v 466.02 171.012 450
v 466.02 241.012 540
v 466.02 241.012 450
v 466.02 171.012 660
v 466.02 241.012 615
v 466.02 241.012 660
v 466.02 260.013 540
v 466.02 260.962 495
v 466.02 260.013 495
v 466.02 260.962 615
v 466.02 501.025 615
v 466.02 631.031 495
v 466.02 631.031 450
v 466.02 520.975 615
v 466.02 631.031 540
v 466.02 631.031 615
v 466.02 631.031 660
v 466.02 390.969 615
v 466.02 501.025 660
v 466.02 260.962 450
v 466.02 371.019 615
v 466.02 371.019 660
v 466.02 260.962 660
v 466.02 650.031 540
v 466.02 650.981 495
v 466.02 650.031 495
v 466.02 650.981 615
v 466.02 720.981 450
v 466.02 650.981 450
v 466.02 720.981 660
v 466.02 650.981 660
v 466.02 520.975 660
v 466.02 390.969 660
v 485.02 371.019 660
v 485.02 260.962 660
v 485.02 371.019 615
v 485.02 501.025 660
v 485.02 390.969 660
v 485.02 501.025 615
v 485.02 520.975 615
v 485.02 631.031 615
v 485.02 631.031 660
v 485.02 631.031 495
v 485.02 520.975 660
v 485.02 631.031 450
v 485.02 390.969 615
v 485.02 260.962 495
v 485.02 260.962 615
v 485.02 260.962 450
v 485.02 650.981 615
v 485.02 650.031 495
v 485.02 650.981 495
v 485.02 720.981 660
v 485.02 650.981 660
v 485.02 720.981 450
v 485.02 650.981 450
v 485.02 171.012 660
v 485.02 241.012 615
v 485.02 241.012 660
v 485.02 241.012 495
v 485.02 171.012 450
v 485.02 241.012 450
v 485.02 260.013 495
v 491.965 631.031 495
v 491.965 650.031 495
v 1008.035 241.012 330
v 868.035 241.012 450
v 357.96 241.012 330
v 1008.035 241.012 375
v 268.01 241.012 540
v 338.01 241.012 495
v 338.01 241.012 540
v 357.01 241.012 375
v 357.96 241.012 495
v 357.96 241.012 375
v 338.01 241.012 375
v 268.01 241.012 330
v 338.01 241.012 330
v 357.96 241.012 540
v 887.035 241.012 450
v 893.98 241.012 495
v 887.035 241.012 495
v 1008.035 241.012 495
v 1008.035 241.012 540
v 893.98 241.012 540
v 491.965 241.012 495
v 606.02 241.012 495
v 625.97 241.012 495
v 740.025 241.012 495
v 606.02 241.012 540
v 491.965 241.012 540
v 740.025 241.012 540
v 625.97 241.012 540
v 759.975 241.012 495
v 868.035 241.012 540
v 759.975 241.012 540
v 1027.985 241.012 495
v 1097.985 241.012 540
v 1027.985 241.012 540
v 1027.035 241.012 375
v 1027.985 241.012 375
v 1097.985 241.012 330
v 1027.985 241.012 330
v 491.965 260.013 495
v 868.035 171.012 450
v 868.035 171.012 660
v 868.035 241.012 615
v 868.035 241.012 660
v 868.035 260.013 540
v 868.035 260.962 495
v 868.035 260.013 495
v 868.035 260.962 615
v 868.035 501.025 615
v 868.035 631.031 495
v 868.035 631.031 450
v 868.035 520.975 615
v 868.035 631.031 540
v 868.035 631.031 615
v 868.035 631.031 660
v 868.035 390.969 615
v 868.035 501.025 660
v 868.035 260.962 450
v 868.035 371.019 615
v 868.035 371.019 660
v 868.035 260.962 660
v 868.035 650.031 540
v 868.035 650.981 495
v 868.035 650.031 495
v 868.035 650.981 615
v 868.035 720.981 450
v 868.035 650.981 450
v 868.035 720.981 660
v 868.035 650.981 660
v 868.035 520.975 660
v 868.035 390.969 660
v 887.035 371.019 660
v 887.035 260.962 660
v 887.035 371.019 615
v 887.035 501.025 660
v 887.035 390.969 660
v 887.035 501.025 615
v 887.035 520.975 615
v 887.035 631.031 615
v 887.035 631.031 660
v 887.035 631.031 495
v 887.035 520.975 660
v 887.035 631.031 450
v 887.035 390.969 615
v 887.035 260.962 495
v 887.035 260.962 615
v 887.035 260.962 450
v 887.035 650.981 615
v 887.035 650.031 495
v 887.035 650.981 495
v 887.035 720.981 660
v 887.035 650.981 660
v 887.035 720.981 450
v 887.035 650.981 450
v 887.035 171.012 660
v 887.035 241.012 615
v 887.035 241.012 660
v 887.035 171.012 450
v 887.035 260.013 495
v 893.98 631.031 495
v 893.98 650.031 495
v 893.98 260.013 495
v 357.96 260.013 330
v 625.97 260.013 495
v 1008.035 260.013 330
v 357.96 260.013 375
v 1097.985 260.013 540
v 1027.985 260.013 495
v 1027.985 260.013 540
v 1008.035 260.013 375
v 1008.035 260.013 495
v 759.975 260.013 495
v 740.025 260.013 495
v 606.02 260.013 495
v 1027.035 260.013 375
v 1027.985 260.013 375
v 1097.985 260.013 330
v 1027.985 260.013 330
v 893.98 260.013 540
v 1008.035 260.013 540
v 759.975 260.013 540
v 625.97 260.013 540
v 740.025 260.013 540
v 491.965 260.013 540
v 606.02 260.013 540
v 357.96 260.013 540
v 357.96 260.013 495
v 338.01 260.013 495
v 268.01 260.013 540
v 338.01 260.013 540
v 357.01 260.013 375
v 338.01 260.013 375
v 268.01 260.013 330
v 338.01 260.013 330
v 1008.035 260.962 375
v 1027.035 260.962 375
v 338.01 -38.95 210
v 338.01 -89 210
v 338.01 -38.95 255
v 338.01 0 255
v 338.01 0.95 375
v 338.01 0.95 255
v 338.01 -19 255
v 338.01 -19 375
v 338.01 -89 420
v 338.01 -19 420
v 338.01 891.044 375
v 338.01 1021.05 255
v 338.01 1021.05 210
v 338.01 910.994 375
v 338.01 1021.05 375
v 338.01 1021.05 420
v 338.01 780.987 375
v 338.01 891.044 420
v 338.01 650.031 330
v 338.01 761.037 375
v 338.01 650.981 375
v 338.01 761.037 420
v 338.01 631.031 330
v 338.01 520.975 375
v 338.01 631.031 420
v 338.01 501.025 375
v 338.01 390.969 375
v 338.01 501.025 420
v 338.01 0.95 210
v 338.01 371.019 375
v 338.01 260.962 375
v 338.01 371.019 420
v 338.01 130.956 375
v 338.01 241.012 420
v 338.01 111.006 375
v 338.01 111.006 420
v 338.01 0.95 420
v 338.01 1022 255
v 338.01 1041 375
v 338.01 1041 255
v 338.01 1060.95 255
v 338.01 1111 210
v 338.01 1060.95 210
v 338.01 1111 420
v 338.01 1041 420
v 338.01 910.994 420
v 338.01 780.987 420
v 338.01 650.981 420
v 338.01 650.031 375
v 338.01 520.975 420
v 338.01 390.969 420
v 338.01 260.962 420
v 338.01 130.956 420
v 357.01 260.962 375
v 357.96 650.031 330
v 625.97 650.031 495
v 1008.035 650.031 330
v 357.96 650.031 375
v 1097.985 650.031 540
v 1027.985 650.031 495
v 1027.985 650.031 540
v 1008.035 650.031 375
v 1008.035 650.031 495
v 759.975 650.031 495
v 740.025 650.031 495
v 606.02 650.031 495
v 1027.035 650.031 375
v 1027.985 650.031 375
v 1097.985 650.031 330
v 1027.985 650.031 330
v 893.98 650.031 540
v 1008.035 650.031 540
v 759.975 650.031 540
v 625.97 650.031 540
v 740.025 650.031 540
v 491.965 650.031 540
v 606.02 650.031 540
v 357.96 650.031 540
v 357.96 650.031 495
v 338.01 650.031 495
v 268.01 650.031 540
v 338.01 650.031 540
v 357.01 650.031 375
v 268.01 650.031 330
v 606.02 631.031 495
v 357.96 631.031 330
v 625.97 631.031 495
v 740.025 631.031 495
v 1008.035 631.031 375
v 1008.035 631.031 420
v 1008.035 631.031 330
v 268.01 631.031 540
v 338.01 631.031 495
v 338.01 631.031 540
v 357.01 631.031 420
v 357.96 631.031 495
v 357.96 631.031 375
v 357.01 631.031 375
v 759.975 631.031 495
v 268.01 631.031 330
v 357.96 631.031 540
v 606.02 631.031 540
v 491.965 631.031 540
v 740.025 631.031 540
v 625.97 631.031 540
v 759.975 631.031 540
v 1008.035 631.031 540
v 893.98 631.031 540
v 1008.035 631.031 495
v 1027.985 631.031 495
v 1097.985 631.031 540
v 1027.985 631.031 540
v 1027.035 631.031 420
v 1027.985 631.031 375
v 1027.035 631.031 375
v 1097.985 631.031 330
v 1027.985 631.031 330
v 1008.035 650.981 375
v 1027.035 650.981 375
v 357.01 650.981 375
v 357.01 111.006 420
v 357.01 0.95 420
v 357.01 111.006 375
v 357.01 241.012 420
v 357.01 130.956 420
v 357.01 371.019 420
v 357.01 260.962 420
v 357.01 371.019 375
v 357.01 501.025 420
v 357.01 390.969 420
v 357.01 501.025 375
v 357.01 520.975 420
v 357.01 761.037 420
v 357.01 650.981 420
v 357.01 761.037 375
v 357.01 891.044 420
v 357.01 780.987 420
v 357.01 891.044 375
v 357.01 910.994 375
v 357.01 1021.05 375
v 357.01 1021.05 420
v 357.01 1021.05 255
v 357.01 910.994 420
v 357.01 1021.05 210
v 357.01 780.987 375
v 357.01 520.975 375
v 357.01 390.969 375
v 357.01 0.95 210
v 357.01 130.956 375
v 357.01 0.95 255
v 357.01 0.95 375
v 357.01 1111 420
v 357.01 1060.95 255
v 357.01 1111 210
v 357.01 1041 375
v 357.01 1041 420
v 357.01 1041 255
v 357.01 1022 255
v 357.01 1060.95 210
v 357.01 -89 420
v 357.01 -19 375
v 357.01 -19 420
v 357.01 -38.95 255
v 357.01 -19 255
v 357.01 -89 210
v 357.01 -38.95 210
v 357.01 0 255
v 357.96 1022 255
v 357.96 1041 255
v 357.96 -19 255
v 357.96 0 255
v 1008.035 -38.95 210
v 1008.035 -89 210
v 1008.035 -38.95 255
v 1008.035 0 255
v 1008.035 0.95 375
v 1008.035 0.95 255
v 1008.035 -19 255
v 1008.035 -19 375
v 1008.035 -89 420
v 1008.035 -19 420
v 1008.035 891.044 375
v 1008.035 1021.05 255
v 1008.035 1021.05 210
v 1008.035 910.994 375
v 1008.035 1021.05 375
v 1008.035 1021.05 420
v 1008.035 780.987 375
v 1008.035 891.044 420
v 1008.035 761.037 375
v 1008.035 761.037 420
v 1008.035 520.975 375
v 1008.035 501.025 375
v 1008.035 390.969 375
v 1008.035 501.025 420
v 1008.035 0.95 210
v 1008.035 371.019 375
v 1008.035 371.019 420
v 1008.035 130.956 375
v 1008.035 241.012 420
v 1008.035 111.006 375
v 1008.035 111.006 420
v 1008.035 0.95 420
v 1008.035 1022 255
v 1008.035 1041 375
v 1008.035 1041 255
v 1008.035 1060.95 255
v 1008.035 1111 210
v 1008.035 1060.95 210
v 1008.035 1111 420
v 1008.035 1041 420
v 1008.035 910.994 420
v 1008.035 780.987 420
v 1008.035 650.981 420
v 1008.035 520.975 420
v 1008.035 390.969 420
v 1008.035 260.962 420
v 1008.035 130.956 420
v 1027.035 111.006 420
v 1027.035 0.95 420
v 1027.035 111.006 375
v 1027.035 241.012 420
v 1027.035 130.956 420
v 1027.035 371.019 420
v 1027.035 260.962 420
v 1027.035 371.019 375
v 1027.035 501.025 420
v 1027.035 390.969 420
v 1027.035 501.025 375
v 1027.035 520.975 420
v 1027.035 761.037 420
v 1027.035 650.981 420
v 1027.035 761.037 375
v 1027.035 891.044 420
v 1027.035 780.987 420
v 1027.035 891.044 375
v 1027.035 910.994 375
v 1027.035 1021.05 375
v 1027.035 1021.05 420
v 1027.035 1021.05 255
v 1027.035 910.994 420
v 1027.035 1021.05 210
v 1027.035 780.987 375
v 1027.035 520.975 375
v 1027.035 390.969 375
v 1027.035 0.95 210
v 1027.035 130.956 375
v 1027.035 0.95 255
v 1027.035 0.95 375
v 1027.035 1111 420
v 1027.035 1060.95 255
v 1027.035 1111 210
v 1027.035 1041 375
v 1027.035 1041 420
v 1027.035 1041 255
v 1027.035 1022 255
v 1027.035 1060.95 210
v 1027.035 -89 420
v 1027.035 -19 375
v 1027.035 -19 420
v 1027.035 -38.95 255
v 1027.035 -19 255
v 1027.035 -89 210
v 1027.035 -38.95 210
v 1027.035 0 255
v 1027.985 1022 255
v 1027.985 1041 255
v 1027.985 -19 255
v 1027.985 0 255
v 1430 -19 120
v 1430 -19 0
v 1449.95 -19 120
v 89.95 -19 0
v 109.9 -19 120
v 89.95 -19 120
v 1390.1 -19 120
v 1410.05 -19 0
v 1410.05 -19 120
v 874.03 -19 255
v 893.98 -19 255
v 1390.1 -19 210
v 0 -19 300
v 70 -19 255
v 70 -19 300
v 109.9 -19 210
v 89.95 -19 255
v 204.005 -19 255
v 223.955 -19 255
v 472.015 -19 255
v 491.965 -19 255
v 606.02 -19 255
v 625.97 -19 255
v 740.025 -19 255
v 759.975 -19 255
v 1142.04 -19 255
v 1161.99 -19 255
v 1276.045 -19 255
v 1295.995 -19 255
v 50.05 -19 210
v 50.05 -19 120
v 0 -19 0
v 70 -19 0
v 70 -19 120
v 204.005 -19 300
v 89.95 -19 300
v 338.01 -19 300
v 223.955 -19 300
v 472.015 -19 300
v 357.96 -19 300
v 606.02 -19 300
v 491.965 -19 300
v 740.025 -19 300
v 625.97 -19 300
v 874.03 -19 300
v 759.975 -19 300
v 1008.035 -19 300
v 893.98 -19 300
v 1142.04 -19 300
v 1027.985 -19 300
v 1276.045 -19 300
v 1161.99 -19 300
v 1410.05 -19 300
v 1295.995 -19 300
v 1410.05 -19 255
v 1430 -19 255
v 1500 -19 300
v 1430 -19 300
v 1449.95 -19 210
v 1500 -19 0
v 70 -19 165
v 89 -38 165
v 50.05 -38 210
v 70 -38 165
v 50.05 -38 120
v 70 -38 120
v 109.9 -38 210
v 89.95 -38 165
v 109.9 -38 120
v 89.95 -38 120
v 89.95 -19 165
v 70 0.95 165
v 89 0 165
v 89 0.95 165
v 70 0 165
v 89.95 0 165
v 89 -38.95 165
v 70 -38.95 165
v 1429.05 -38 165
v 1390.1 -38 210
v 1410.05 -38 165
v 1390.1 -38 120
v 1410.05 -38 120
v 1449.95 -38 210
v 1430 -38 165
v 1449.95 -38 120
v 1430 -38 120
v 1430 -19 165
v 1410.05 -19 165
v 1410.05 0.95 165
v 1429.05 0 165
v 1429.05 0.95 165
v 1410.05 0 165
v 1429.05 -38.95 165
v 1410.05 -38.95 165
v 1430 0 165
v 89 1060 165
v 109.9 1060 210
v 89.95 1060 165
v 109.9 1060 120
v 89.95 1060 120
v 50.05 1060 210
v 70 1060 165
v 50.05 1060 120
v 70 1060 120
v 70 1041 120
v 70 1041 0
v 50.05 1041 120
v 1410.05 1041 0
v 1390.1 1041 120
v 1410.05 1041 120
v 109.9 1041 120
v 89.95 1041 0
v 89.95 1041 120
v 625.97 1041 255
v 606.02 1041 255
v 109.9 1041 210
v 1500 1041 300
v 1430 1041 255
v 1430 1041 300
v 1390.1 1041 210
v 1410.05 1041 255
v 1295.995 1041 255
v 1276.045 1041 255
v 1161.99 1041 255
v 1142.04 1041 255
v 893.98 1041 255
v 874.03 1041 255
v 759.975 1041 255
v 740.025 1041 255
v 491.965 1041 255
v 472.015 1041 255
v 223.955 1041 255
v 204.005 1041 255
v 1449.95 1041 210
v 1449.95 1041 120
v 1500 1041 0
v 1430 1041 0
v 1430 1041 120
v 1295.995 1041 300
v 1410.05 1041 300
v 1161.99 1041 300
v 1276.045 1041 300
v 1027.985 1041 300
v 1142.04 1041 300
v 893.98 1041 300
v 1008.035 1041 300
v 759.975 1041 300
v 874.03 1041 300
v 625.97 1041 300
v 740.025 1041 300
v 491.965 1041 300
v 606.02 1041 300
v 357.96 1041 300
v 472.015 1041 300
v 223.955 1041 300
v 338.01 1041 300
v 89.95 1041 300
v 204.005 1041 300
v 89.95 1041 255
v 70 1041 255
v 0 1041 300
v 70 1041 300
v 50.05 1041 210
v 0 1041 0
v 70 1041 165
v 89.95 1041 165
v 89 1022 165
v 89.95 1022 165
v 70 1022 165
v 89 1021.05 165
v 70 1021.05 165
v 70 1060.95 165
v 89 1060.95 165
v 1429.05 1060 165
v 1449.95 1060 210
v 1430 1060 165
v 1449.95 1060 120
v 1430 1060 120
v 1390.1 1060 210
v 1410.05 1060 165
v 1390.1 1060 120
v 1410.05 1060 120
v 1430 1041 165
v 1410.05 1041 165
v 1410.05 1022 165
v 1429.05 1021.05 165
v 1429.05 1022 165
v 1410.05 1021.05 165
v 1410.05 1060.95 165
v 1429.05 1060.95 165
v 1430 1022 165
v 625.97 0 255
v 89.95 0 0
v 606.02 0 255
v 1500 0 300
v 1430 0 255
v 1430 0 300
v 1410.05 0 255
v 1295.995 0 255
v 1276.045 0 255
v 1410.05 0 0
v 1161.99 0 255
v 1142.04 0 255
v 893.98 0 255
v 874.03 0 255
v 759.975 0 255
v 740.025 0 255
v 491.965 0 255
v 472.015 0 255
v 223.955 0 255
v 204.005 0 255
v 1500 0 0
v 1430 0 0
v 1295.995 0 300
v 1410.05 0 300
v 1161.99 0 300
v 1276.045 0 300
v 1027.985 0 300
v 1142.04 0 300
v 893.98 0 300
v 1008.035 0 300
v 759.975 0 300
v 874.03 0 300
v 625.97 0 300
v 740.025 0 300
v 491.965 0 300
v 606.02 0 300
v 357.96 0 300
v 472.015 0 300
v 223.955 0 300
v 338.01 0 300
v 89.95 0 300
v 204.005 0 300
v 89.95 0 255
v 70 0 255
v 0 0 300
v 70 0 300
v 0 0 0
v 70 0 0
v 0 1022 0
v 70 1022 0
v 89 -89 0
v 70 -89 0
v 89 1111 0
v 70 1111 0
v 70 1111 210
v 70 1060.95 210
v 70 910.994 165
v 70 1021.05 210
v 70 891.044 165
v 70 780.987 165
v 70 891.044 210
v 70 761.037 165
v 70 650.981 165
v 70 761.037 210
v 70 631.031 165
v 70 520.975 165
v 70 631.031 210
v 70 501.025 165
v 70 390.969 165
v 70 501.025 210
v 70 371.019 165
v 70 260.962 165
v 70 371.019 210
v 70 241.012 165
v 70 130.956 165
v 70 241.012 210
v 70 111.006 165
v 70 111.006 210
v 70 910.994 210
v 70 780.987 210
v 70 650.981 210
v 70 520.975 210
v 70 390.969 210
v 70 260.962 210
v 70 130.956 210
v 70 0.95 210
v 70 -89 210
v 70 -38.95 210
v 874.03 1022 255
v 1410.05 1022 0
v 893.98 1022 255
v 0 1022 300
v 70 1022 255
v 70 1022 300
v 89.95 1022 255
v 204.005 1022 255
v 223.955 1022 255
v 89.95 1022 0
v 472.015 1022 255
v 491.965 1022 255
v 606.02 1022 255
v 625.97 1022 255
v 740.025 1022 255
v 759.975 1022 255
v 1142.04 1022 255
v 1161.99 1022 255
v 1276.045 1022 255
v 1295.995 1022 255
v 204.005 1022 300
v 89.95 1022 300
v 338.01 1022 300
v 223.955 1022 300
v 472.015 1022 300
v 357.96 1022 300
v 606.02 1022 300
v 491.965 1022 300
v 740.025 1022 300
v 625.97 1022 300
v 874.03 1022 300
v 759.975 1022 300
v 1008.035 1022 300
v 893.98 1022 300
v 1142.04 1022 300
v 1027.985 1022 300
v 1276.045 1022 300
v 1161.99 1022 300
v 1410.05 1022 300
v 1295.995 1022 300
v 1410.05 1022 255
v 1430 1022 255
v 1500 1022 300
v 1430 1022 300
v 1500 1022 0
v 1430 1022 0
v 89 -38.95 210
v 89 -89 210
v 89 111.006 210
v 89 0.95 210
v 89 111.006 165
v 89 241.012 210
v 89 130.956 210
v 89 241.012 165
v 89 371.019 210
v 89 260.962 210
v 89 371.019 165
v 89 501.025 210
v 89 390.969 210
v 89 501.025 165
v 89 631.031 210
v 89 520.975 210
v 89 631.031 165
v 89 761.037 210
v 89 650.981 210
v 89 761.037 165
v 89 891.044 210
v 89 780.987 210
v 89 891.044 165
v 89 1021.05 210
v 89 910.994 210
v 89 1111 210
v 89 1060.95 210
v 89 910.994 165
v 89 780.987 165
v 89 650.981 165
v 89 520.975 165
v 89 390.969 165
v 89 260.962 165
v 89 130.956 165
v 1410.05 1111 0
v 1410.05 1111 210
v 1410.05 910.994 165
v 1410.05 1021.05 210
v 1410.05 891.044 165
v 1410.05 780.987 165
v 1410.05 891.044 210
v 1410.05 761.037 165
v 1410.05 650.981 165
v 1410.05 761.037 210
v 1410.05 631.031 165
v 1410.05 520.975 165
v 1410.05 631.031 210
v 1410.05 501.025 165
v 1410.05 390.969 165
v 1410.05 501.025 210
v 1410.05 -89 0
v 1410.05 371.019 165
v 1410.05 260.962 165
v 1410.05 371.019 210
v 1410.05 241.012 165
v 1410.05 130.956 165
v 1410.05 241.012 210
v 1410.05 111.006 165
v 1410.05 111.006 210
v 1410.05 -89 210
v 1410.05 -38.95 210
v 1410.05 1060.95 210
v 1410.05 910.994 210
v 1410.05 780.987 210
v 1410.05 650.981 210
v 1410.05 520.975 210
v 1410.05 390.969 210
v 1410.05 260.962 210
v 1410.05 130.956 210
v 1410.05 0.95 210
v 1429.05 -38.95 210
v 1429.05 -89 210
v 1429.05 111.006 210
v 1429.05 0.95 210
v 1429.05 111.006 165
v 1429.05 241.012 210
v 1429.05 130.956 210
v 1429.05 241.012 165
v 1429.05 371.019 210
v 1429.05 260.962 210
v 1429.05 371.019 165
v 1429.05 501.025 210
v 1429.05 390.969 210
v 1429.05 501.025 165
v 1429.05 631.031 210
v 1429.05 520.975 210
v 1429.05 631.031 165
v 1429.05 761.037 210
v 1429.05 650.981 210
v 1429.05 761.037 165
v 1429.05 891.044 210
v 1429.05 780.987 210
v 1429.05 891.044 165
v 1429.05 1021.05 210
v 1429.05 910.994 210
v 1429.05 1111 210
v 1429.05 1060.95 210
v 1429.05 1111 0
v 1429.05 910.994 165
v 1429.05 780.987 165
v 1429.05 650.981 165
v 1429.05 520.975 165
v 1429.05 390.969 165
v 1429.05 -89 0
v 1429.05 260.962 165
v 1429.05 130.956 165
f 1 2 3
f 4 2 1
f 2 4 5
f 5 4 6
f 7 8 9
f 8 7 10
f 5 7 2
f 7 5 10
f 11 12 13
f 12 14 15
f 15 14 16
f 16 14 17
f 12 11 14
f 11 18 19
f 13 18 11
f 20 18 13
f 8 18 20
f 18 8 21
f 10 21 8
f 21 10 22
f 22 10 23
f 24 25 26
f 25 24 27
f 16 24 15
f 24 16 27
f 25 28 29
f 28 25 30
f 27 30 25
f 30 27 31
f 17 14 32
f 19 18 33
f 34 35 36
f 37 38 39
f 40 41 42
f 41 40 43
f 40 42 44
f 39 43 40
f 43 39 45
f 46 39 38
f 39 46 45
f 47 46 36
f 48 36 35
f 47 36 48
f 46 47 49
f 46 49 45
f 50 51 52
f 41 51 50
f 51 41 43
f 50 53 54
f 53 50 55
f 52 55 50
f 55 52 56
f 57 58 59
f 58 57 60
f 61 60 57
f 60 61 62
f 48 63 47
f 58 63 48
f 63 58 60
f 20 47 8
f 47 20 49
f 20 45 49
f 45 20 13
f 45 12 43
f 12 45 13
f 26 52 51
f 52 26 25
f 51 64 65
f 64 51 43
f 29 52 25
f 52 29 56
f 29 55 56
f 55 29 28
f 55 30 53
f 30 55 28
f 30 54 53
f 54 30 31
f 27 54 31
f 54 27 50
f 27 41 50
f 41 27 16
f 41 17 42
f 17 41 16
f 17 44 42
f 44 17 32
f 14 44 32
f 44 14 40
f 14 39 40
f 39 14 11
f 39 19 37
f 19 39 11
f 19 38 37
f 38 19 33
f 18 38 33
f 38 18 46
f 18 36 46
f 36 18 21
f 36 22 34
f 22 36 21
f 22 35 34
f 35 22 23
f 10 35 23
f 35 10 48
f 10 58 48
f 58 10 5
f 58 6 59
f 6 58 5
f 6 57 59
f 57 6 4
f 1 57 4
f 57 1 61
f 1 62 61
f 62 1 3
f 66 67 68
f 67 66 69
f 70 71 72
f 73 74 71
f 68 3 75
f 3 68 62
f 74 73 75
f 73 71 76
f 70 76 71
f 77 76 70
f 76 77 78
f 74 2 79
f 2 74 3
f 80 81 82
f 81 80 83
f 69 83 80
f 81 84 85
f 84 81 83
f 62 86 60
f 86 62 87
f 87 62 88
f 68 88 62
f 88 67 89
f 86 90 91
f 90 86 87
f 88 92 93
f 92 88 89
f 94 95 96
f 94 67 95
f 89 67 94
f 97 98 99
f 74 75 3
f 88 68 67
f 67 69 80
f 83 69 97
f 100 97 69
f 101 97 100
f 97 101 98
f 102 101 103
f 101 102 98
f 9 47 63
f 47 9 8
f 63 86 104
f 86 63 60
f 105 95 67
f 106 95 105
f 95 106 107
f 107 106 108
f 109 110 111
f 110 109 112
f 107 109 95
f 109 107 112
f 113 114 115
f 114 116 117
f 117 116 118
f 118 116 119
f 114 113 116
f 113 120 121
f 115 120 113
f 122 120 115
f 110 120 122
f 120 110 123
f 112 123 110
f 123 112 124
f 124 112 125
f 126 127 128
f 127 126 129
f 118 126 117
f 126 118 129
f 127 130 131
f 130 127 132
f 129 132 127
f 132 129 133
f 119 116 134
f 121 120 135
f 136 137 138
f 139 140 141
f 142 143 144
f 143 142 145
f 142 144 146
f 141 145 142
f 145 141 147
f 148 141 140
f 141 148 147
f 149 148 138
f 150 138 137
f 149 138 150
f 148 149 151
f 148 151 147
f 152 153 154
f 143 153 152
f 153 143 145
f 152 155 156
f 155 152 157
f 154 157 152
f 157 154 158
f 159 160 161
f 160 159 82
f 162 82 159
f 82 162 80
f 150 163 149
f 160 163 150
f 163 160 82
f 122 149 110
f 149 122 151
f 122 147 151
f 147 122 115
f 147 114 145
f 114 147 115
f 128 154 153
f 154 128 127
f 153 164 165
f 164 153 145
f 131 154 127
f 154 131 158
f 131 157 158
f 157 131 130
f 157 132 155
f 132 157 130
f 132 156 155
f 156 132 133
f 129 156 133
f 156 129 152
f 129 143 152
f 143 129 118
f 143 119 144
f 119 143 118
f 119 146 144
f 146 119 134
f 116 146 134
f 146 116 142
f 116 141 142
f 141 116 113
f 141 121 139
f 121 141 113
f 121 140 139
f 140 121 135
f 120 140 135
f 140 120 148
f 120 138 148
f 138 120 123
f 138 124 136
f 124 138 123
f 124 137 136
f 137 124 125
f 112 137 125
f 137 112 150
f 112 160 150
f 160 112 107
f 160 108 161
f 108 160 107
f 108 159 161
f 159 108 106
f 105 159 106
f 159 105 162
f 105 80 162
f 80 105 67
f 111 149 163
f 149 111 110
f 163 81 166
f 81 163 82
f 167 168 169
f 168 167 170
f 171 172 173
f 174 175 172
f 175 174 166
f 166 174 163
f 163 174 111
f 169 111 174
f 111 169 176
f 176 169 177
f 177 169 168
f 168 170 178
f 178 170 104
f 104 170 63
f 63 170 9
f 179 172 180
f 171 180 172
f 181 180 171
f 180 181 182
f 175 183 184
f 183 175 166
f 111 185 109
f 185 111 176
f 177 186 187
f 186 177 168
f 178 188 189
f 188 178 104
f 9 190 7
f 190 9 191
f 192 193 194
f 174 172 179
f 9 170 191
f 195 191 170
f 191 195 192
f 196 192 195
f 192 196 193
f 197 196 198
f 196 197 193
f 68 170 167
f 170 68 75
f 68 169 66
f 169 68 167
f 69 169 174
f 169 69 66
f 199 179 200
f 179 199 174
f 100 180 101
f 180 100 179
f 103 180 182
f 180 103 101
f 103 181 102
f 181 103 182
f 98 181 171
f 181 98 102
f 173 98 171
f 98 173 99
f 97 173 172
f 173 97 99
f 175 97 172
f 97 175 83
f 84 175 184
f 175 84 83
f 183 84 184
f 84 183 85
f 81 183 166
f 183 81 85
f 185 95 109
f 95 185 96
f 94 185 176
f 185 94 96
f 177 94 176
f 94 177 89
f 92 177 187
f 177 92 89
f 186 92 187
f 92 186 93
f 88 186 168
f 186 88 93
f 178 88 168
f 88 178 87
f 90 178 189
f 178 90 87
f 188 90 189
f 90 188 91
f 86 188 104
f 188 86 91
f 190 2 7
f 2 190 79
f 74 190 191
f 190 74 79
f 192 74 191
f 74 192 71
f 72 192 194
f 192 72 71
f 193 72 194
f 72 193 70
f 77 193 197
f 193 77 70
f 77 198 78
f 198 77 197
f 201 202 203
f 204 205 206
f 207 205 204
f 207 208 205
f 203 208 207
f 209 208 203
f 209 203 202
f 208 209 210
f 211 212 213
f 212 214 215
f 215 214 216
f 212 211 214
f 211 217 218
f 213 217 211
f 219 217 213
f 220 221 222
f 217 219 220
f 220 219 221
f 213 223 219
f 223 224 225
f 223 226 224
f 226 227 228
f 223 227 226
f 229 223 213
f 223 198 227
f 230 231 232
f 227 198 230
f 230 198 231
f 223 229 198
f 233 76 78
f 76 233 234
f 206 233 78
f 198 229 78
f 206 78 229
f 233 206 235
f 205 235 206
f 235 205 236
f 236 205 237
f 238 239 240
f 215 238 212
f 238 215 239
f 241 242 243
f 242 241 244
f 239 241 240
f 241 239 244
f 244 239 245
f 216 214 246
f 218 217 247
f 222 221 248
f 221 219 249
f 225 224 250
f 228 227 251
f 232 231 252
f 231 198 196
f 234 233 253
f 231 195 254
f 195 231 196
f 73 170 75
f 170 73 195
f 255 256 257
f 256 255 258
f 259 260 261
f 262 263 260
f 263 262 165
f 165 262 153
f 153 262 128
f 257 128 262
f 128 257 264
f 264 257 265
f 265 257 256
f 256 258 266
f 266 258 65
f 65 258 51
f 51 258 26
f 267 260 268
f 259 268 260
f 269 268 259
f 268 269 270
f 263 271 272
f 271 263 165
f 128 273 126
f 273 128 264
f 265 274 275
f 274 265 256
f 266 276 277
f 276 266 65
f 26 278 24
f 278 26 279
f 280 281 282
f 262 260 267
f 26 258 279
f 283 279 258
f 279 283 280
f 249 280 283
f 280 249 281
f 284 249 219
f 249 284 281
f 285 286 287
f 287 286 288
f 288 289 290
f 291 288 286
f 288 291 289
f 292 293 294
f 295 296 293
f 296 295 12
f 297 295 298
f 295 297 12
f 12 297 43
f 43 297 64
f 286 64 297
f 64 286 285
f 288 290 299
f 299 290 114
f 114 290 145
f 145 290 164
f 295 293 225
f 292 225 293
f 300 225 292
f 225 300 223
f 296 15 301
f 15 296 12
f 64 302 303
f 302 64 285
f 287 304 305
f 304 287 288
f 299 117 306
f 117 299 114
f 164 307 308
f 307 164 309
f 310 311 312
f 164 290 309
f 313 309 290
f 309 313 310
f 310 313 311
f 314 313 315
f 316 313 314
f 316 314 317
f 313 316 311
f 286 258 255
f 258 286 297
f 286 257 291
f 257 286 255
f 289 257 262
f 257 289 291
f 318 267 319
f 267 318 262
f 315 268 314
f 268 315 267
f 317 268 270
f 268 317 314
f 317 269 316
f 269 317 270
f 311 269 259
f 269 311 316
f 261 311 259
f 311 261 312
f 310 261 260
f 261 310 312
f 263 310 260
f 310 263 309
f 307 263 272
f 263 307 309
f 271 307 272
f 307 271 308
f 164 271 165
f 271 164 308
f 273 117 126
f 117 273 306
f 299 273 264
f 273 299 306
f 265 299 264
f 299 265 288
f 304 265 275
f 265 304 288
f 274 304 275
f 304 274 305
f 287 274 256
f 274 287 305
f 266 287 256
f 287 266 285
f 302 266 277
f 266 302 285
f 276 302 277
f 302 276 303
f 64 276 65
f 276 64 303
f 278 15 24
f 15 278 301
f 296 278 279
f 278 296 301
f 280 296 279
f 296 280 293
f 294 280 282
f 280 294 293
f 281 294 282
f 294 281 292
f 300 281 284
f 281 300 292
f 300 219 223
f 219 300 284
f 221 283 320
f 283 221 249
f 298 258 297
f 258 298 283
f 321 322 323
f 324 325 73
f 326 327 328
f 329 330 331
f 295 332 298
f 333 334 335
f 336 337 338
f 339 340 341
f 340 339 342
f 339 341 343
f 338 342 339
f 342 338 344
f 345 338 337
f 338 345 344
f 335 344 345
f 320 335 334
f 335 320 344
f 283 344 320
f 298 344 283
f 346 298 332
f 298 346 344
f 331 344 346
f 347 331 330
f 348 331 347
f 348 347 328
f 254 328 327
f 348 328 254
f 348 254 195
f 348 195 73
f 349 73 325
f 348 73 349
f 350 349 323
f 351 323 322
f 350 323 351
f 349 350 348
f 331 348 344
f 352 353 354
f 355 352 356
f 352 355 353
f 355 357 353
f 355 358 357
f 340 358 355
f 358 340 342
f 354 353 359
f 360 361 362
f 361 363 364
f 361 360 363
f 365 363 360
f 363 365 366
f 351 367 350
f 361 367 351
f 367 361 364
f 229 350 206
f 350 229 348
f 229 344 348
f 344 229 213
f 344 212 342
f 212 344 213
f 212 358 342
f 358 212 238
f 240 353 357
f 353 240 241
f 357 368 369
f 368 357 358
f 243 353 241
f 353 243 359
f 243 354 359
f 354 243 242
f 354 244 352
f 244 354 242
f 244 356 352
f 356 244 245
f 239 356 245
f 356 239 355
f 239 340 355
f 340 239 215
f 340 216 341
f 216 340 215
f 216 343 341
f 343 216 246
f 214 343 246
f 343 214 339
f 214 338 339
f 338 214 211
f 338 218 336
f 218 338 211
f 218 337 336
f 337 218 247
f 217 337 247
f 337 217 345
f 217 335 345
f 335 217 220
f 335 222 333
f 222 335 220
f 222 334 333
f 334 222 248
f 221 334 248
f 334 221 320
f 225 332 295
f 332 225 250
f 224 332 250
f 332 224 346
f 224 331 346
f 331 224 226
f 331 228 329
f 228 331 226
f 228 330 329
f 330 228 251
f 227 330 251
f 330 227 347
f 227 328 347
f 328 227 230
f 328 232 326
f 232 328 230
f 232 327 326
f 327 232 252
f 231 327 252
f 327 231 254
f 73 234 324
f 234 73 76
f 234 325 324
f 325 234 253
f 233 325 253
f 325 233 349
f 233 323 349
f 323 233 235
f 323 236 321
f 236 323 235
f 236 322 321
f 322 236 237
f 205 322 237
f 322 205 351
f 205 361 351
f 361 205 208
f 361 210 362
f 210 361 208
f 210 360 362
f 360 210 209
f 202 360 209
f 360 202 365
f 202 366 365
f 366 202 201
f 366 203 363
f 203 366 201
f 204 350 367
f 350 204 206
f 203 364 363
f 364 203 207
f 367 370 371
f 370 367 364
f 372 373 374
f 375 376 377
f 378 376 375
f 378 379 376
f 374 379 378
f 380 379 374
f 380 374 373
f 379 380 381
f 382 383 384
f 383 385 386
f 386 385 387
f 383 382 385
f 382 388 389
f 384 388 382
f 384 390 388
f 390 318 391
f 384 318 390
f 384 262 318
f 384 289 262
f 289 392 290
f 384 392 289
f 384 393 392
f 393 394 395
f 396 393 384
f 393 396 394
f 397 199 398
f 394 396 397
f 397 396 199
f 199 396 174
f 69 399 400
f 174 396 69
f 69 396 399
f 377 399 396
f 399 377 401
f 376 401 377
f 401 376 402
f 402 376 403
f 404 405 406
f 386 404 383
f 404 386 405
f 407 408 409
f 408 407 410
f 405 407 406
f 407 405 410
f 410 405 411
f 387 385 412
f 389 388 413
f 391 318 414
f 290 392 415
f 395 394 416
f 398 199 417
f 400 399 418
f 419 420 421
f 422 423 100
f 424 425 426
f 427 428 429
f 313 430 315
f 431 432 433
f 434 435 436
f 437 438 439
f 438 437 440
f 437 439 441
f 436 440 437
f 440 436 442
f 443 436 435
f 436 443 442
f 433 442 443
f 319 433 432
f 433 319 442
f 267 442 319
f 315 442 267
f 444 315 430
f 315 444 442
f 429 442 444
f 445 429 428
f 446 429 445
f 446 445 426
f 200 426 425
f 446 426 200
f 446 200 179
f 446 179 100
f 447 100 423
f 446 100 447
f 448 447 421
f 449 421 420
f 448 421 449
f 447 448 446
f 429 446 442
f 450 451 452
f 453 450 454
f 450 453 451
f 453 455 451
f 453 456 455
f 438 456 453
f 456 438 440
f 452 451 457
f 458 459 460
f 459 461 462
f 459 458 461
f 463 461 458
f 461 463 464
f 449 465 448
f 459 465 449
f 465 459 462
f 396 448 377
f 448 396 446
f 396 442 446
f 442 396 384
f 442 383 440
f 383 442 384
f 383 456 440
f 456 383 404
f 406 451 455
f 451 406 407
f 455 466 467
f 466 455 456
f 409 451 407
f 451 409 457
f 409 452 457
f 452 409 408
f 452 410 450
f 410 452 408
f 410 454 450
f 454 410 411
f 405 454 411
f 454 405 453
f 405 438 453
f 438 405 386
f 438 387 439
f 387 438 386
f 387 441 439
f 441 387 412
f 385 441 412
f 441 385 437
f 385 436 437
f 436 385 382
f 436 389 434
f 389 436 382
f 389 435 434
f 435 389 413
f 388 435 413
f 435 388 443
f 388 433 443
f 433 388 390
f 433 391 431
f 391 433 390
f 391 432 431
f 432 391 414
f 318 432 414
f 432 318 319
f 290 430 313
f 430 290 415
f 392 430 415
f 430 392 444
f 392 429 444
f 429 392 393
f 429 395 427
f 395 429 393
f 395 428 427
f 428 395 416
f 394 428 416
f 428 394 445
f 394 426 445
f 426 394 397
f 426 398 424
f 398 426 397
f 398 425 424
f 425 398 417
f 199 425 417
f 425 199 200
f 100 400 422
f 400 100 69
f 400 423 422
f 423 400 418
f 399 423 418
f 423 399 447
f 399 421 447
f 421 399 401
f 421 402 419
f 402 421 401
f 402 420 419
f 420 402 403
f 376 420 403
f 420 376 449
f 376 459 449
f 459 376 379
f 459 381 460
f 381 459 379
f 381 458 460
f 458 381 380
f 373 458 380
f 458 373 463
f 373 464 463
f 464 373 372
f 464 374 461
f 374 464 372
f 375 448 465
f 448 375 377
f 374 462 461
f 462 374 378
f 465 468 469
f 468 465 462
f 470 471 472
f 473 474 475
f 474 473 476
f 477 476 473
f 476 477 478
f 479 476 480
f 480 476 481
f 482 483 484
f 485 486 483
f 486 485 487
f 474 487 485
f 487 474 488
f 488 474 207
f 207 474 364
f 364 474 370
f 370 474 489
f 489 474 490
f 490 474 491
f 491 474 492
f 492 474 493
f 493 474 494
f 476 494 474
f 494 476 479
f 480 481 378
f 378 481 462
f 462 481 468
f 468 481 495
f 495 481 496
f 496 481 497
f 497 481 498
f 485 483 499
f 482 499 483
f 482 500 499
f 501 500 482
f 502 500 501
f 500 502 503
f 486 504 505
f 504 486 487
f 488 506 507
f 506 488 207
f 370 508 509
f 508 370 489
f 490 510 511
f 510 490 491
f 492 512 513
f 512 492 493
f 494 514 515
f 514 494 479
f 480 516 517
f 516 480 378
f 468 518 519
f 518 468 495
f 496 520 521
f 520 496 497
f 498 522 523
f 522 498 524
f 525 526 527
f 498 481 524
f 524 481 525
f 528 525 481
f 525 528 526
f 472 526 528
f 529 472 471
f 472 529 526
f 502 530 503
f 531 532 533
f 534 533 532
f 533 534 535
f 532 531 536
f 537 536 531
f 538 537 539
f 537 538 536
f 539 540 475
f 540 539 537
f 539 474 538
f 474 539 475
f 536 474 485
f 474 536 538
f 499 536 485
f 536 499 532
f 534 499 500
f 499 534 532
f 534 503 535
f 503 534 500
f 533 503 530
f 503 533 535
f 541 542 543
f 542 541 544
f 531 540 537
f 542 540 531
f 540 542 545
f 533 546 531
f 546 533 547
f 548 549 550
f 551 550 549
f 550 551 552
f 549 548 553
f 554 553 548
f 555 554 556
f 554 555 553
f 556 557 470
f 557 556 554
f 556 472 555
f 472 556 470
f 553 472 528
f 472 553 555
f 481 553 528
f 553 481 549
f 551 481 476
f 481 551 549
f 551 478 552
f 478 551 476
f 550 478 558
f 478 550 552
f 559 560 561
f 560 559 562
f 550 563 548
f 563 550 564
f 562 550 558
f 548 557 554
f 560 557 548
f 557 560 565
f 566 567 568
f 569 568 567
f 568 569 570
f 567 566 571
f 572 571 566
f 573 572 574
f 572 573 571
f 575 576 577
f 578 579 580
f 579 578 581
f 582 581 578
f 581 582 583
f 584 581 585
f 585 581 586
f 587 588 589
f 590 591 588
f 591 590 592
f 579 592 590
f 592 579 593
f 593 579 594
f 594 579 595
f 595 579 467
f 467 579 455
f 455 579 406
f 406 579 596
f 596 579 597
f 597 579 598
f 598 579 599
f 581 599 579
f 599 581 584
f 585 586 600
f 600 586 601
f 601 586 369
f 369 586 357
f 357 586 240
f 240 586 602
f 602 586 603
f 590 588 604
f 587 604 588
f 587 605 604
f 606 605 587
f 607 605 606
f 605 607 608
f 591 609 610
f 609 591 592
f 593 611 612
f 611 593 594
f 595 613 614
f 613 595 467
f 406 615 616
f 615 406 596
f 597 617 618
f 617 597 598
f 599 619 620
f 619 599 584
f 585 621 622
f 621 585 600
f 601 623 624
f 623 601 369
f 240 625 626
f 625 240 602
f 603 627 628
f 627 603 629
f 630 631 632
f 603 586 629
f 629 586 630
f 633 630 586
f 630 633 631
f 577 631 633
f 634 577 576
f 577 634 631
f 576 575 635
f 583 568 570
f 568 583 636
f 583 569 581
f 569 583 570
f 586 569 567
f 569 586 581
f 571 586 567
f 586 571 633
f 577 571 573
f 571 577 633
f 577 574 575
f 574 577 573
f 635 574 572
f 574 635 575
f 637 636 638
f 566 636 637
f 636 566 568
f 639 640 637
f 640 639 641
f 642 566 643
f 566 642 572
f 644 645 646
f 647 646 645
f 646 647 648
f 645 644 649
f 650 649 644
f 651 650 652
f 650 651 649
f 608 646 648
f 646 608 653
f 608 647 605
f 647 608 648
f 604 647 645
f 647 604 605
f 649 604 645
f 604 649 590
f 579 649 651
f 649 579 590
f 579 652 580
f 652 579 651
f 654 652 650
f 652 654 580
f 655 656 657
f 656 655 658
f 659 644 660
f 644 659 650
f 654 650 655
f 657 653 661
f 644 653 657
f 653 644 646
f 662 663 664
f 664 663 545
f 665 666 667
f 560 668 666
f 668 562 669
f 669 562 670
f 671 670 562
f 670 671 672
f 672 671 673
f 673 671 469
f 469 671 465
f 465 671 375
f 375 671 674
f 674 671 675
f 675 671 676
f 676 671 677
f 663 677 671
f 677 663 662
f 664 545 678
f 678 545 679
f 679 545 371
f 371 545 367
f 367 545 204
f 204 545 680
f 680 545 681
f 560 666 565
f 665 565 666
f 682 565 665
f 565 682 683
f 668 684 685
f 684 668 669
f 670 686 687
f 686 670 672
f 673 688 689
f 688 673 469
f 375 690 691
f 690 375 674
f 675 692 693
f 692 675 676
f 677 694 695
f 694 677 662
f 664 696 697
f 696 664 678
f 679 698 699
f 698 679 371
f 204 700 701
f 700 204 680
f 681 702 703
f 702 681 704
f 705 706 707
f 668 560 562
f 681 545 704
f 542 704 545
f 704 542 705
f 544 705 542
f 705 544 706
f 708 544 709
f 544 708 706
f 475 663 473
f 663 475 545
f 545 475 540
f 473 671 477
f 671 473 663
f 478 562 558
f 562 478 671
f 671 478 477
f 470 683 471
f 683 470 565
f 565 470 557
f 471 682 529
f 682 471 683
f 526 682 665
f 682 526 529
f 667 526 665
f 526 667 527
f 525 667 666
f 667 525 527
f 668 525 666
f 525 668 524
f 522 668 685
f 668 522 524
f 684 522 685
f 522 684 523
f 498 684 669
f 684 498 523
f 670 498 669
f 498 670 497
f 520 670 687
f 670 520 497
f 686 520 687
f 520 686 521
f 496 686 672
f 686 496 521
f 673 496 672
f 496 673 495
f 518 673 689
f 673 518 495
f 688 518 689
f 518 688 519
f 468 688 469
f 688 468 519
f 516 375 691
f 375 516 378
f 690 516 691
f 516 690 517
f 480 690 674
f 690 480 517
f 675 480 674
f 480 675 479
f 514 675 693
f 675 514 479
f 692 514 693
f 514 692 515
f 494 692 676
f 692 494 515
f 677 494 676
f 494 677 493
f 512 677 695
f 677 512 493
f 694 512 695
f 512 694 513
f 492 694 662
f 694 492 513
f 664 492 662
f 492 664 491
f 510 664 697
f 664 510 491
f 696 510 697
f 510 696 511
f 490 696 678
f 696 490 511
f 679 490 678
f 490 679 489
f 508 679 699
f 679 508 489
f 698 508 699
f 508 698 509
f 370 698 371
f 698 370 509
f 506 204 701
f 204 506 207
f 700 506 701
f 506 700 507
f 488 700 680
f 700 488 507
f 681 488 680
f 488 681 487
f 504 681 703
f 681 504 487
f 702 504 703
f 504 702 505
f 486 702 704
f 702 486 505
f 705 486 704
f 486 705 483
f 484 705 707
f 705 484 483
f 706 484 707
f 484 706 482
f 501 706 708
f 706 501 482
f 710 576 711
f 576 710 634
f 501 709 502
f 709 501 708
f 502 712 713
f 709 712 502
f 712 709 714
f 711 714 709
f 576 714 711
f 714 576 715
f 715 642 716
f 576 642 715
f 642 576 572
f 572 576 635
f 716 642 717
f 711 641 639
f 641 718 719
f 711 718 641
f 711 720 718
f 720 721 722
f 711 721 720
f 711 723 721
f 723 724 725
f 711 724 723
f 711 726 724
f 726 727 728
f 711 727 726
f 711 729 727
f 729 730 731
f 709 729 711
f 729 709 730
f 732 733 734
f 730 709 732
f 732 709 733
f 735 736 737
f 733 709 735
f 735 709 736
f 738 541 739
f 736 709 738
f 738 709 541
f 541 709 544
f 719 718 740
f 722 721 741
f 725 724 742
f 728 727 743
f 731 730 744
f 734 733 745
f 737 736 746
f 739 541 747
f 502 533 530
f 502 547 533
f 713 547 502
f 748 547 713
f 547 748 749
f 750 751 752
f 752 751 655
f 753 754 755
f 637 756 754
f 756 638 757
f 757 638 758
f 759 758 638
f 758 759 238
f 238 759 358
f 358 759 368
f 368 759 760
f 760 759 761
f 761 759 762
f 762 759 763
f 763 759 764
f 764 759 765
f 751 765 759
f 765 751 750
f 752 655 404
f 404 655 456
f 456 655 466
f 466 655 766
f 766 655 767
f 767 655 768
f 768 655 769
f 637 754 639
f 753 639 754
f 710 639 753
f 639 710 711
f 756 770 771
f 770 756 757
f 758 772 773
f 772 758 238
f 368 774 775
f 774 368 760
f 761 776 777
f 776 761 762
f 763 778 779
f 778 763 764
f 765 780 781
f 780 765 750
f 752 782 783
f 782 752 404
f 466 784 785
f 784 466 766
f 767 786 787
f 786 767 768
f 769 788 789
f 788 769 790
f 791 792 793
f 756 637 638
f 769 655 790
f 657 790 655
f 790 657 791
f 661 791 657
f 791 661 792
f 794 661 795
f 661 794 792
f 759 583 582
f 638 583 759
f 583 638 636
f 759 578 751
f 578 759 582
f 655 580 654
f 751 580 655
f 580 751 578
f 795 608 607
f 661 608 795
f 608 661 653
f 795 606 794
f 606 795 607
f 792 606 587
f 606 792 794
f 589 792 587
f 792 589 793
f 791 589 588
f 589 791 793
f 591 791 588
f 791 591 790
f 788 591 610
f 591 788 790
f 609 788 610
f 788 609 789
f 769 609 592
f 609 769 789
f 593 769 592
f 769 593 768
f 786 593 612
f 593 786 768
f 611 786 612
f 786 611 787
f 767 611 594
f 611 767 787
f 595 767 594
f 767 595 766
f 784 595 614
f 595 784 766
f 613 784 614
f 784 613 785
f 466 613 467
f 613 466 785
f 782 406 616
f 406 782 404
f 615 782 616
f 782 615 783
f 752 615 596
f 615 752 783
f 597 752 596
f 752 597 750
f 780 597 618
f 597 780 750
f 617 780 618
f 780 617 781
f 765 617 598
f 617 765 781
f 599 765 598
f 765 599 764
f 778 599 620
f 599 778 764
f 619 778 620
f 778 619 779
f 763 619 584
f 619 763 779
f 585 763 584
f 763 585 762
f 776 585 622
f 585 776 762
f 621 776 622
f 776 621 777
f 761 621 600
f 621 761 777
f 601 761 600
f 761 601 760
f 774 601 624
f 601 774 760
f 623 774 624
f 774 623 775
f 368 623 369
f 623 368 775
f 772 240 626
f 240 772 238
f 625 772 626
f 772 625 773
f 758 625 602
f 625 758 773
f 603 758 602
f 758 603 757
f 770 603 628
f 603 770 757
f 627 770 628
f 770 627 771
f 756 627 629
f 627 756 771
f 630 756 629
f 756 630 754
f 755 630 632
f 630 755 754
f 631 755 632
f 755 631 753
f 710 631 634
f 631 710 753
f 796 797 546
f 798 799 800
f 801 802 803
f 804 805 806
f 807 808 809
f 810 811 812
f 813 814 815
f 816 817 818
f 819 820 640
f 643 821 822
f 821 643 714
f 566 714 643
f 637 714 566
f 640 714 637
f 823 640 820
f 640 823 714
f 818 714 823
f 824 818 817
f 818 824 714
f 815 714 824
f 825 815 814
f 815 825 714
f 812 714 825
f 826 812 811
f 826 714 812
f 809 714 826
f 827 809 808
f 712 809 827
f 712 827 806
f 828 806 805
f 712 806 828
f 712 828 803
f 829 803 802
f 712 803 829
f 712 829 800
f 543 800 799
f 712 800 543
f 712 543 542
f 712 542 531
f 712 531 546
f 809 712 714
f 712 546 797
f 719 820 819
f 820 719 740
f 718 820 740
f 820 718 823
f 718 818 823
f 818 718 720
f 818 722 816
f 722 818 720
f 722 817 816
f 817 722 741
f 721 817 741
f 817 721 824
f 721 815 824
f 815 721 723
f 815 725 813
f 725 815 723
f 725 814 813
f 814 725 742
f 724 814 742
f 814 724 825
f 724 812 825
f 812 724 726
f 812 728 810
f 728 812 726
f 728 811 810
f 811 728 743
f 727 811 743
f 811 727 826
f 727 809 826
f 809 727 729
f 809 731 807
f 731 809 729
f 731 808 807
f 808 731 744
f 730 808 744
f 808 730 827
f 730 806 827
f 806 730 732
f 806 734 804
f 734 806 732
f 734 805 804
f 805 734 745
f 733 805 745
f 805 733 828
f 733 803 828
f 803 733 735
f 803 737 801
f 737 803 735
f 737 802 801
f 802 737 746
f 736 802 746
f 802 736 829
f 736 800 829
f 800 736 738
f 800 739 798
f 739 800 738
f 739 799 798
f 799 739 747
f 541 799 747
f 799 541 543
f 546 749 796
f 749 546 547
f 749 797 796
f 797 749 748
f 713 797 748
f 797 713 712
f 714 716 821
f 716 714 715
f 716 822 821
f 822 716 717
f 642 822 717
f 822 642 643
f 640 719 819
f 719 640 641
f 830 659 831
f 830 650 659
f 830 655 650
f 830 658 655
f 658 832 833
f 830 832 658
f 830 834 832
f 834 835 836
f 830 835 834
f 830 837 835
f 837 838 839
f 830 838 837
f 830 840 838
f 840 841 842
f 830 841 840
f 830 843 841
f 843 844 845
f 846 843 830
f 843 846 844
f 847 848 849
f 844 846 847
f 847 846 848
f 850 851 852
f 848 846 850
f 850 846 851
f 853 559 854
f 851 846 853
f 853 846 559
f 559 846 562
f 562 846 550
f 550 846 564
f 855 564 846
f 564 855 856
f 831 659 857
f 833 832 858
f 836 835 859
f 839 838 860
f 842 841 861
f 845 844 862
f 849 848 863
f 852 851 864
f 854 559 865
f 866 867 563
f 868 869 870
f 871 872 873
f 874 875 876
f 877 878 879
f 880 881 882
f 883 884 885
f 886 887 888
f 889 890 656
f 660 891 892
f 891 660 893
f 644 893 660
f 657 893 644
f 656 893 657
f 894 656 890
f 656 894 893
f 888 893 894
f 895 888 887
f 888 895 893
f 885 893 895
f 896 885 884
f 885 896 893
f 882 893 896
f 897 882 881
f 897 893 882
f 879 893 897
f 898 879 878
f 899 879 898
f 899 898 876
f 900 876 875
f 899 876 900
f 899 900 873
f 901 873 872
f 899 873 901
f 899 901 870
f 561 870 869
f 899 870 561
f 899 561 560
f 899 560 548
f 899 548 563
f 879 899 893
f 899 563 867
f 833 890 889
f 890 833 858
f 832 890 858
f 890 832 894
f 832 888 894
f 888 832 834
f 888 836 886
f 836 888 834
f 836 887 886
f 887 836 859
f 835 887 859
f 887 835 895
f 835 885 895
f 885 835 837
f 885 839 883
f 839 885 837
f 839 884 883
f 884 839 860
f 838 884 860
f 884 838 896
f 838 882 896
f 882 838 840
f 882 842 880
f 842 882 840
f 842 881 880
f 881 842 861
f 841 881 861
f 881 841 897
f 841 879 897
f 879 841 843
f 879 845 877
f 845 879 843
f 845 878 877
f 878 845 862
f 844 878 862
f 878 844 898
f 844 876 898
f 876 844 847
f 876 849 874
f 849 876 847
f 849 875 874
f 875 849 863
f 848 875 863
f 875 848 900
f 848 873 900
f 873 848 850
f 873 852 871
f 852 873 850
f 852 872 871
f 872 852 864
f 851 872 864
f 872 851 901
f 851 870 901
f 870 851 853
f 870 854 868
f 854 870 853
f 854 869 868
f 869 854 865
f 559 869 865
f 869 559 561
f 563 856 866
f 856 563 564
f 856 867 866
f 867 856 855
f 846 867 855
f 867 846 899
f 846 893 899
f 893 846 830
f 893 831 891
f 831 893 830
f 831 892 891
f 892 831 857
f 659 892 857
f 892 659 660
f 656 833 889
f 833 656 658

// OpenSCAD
/*  Squarden. Highly configurable gardening squares based on Growgrid by Aker but here you can change the wood thickness.
    Copyright (C) 2016  PMorel for Thilab (www.thilab.fr)

    This program is free software: you can redistribute it and/or modify
    it under the terms of the GNU General Public License as published by
    the Free Software Foundation, either version 3 of the License, or
    (at your option) any later version.

    This program is distributed in the hope that it will be useful,
    but WITHOUT ANY WARRANTY; without even the implied warranty of
    MERCHANTABILITY or FITNESS FOR A PARTICULAR PURPOSE.  See the
    GNU General Public License for more details.

    You should have received a copy of the GNU General Public License
    along with this program.  If not, see <http://www.gnu.org/licenses/>.
*/
/* [Build parameters (in millimeters)] */
//Scale (to be able to test your design. The scale is not applied to the wood thickness)
scale = 1; //[0.1:0.1:1]

// Length of the left and right sides of the base
side_length=1500;
// Height of the left and right sides of the base 
side_height=300;
// Margin to apply on the left and right sides 
base_side_margin=70;
 // Longueur des cotés avant et arrière de la base  mais aussi du niveau 1 
 // Length of front and back sides
front_length=1200;
// Wood thickness
wood_thick=19;
// Slack in the slits in percentage of the wood thickness
slack=5;

// Minimal distance between two slits. Used to calculate the number of slits on each side 
slit_min=130;

// 2D or 3D representation.
type_of_view="3D"; // [2D,3D]

/* [3D View only] */

// Slit position of the fist level rear side
level1_pos_rear=3;
// Slit position of the fist level front side
level1_pos_front=8;
// Slit position of the second level left side
level2_pos_left=3;
// Slit position of the second right left side
level2_pos_right=6;
// Slit position of the third level rear side
level3_pos_rear=2;
// Slit position of the third level front side
level3_pos_front=5;

/* [Hidden] */

// Calculated

base_side_length=side_length*scale;
base_side_height=side_height*scale;
side_margin=base_side_margin*scale;
base_front_height=0.7*base_side_height;
ecart_slit_min=slit_min*scale;
front_margin=side_margin;
base_front_length=front_length*scale;
// Largeur d'une fente (10% de l'épaisseur du bois)
slit_width=wood_thick*(1+slack/100); //10 pourcent de marge pour l'emboitement
// Hauteur d'une fente (dépend des hauteurs des cotés avant/arrière et gauche/droit
slit_height=(base_side_height - base_front_height)/2;

if( type_of_view=="2D" )
    draw_2D();
else
    draw_3D();


// Draw a 2D view. Export it as DXF to use it on your own CNC machine.
module draw_2D() {
    separ_pieces = 20*scale;
    blocker_shift_Y = slit_height*2 + separ_pieces;
    blocker_shift_X = slit_width*3 + separ_pieces;

    // Niveau 1 avant / arrière
    nb_slits_base = getSlits(base_side_length, side_margin);
    nb_slits_front = getSlits(base_front_length, front_margin);
    shift_side = getShiftSlit(base_side_length, side_margin, nb_slits_base)+slit_width;
    shift_front = getShiftSlit(base_front_length, front_margin, nb_slits_front)+slit_width;
    
    // Niveau 2 gauche et droite            
    level2_length = side_margin*2 + shift_side*(level1_pos_front-level1_pos_rear)+slit_width;

    // Level 3 avant / arrière
    level3_length = front_margin*2 + shift_front*(level2_pos_right-level2_pos_left)+slit_width;
    
    base_side_shift_X = base_side_length + separ_pieces;
    base_side_shift_Y = base_side_height + separ_pieces;

    base_front_shift_X = base_front_length + separ_pieces;
    base_front_shift_Y = base_front_height + separ_pieces;


    
    translate([0, 0]) {

        // Base mur avant et arrière
        translate([0,0])
            rotate([0,0,0])
                    base_front_rear();

        translate([0,base_front_shift_Y])
            rotate([0,0,0])
                    base_front_rear();
        
        // Niveau 1
        translate([0,base_front_shift_Y*2]) {
            translate([0,0])
                rotate([0,0,0])
                    level1_front_rear();

            translate([0,base_front_shift_Y])
                rotate([0,0,0])
                     level1_front_rear();
        }
        
        // Base murs gauche et droite
        translate([0, base_front_shift_Y*4]) {
            
            translate([0,0])
                rotate([0,0,0])
                        base_left_right();

            translate([0,base_side_shift_Y])
                rotate([0,0,0])
                        base_left_right();
            
            // Blockers
            translate([base_side_shift_X,0]) {
                translate([0,0])
                    rotate([0,0,0])
                           do_blocker();

                translate([0,blocker_shift_Y*1])
                    rotate([0,0,0])
                            do_blocker();

                translate([0,blocker_shift_Y*2])
                    rotate([0,0,0])
                            do_blocker();

                translate([0,blocker_shift_Y*3])
                    rotate([0,0,0])
                            do_blocker();
            }

        }
    }

    // Niveaux 2 et 3
    translate([base_front_shift_X,0]) {

        translate([0, 0]) {
            
            translate([0,0])
                rotate([0,0,0])
                        level2_3(level2_length, side_margin);

            translate([0,base_front_shift_Y])
                rotate([0,0,0])
                        level2_3(level2_length, side_margin);
            
            translate([0, base_front_shift_Y*2]) {
                
                translate([0,0]) 
                    rotate([0,0,0])
                            level2_3(level3_length, front_margin);

                translate([0,base_front_shift_Y])
                    rotate([0,0])
                            level2_3(level3_length, front_margin);
            }            
        }         
    }
}


// Draw a 3D view. Used to see if everything is correct before to export it in DXF 
module draw_3D() {
    translate([side_margin-slit_width,-wood_thick,base_front_height-2*slit_height])
        rotate([90,0,0])
            linear_extrude(wood_thick) 
                do_blocker();

    translate([base_side_length-side_margin-slit_width*2,-wood_thick,base_front_height-2*slit_height])
        rotate([90,0,0])
            linear_extrude(wood_thick) 
                do_blocker();

    translate([side_margin-slit_width,base_front_length-2*side_margin,base_front_height-2*slit_height])
        rotate([90,0,0])
            linear_extrude(wood_thick) 
                do_blocker();

    translate([base_side_length-side_margin-slit_width*2,base_front_length-2*side_margin,base_front_height-2*slit_height])
        rotate([90,0,0])
            linear_extrude(wood_thick) 
                do_blocker();
        
    // Base murs gauche et droite
    translate([0,0,0])
        rotate([90,0,0])
            linear_extrude(wood_thick) 
                base_left_right();

    translate([0,base_front_length-2*front_margin-wood_thick,0])
        rotate([90,0,0])
            linear_extrude(wood_thick) 
                base_left_right();
                
    // Base mur avant et arrière
    translate([side_margin,-front_margin-wood_thick,0])
        rotate([90,0,90])
            linear_extrude(wood_thick) 
                base_front_rear();

    translate([base_side_length - side_margin - slit_width,-front_margin-wood_thick,0])
        rotate([90,0,90])
            linear_extrude(wood_thick) 
                base_front_rear();

    // Niveau 1 avant / arrière
    nb_slits_base = getSlits(base_side_length, side_margin);
    nb_slits_front = getSlits(base_front_length, front_margin);
    shift_side = getShiftSlit(base_side_length, side_margin, nb_slits_base)+slit_width;
    shift_front = getShiftSlit(base_front_length, front_margin, nb_slits_front)+slit_width;

    translate([front_margin+shift_side*(level1_pos_rear-1),0,base_front_height]) {
        translate([0,-front_margin-wood_thick,0])
            rotate([90,0,90])
                linear_extrude(wood_thick) 
                    level1_front_rear();

        translate([shift_side*(level1_pos_front-level1_pos_rear),-front_margin-wood_thick,0])
            rotate([90,0,90])
                linear_extrude(wood_thick) 
                    level1_front_rear();

        // Niveau 2 gauche et droite            
        level2_length = side_margin*2 + shift_side*(level1_pos_front-level1_pos_rear)+slit_width;

        //Translation globale de tous les niveaux à partir du 2 pour pouvoir travailler comme si on était à l'origine
        translate([-side_margin, shift_front*(level2_pos_left-1)-front_margin, (base_front_height-2*slit_height)]) {
            
            translate([0,front_margin,0])
                rotate([90,0,0])
                    linear_extrude(wood_thick) 
                        level2_3(level2_length, side_margin);

            translate([0,shift_front*(level2_pos_right-level2_pos_left)+front_margin,0])
                rotate([90,0,0])
                    linear_extrude(wood_thick) 
                        level2_3(level2_length, side_margin);
            
            // Level 3 avant / arrière
            level3_length = front_margin*2 + shift_front*(level2_pos_right-level2_pos_left)+slit_width;
            translate([shift_side*(level2_pos_left-1)-side_margin, -wood_thick, base_front_height-2*slit_height]) {
                
                translate([0,0,0]) // shift_front*(level3_pos_rear-1)
                    rotate([90,0,90])
                        linear_extrude(wood_thick) 
                            level2_3(level3_length, front_margin);

                translate([shift_side*(level2_pos_right-level2_pos_left),0,0])
                    rotate([90,0,90])
                        linear_extrude(wood_thick) 
                            level2_3(level3_length, front_margin);
            }            
        }         
    }
}

module base_left_right() {
    difference() {
        square([base_side_length,base_side_height]);
        translate([0,base_side_height-slit_height,0]) 
            do_slits(base_side_length,side_margin, slit_width);
        translate([side_margin, 0, 0])
            do_slit(slit_width, base_front_height-slit_height);
        translate([base_side_length-side_margin-slit_width, 0, 0])
            do_slit(slit_width, base_front_height-slit_height);
    }
}



module base_front_rear() {
    difference() {
        square([base_front_length,base_front_height]);
        translate([0,base_front_height-slit_height,0]) 
            do_slits(base_front_length,front_margin, slit_width);
        translate([side_margin-slit_width, base_front_height-slit_height, 0])
            do_slit();
        translate([base_front_length-side_margin, base_front_height-slit_height, 0])
            do_slit();
    }    
}

module level1_front_rear() {
    difference() {
        square([base_front_length,base_front_height]);
        translate([0,base_front_height-slit_height,0]) 
            do_slits(base_front_length,front_margin, slit_width);
        translate([front_margin-slit_width, 0, 0])
            do_slit();
        translate([base_front_length-front_margin, 0, 0])
            do_slit();
        translate([base_front_length-front_margin-slit_width, 0, 0])
            do_slit();
        translate([front_margin, 0, 0])
            do_slit();
    }
}

module level2_3(length, margin) {
    difference() {
        square([length,base_front_height]);
        translate([0,base_front_height-slit_height,0]) 
            do_slits(length, margin, slit_width);
        *translate([margin-slit_width, 0, 0])
            do_slit();
        *translate([length-margin, 0, 0])
            do_slit();
        translate([length-margin-slit_width, 0, 0])
            do_slit();
        translate([margin, 0, 0])
            do_slit();
    }

}


module do_slit(width=slit_width, height=slit_height) {
    square([width, height]);
}

module do_slits(length, margin, slit_width) {

    slits = getSlits(length, margin);
    shift_slit = getShiftSlit(length, margin, slits );
    
    echo("Slits=", floor(slits), " shift_slit=", shift_slit);
    for(i=[0:slits-1]) {
        translate([i*(shift_slit+slit_width)+margin, 0, 0])
            do_slit();
    }
}

module do_blocker() {
            difference() {
                square([slit_width*3, slit_height*2]);
                translate([slit_width,0])
                    do_slit();
            }
}

function getShiftSlit(length, margin, nb_slits) = (getSlitZone(length, margin) - nb_slits*slit_width)/(nb_slits - 1);

function getSlits(length, margin) = ceil(getSlitZone(length, margin) / ecart_slit_min);

function getSlitZone( length, margin ) = length-2*margin;
